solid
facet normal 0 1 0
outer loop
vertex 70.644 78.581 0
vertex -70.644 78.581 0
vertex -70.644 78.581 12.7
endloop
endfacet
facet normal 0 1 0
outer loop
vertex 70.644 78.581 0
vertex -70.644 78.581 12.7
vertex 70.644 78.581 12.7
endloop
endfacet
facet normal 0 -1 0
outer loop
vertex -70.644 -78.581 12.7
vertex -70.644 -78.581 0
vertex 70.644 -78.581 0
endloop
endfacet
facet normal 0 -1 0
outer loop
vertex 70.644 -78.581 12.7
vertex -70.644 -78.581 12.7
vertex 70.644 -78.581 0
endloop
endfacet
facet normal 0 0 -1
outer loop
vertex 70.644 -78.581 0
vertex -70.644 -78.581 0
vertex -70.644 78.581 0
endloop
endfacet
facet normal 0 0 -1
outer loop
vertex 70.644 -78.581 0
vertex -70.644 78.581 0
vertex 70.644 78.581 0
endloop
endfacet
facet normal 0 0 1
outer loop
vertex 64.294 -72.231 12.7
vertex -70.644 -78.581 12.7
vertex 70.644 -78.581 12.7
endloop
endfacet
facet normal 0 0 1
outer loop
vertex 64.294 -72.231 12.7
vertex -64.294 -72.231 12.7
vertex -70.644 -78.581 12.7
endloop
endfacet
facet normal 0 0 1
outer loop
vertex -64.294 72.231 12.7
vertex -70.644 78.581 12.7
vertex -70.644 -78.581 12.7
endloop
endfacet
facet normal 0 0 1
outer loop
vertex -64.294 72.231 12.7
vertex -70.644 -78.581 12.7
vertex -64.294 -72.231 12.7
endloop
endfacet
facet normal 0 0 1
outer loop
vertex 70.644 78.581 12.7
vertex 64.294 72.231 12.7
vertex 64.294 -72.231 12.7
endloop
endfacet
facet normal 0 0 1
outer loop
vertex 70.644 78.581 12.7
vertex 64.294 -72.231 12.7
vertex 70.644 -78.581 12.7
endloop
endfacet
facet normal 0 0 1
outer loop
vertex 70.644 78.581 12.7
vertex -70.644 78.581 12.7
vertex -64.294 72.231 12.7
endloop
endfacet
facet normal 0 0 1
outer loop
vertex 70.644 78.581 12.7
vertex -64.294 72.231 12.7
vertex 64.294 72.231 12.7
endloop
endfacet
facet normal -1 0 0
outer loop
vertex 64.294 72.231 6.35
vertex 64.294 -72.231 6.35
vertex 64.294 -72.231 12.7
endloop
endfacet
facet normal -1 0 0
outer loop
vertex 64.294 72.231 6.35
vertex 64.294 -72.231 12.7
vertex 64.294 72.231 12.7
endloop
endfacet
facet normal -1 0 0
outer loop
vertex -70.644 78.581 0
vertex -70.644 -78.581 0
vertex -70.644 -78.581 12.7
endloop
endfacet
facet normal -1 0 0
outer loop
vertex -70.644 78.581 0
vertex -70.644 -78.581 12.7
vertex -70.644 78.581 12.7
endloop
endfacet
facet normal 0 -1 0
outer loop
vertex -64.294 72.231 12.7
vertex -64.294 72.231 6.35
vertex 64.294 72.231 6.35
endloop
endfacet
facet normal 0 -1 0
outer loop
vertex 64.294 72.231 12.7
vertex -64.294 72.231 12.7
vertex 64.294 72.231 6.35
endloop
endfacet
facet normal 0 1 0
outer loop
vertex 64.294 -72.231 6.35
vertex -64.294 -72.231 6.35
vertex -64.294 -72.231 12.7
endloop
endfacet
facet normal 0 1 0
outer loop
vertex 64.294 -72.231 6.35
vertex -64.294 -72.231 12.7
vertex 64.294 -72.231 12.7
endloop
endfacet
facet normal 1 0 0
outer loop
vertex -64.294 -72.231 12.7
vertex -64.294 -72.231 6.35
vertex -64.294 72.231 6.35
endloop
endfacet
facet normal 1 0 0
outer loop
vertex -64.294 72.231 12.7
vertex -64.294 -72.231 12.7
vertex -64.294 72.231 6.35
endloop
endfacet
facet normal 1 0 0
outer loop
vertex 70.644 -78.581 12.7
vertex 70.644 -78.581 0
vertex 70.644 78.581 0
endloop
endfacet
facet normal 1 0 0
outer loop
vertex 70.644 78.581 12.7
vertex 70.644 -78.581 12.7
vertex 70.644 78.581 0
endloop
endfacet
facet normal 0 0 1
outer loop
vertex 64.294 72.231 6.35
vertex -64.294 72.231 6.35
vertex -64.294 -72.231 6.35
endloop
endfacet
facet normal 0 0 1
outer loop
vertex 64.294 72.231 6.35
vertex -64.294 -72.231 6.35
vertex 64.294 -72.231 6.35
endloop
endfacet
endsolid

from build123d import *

# Parameters (mm, degrees)
SKETCH2_W           = 141.2875
SKETCH2_H           = 157.1625
BOSS_EXTRUDE1_DEPTH = 12.7
SHELL1_T            = -6.35


with BuildPart() as part:
    # Sketch2 → Boss-Extrude1 (new body)
    with BuildSketch(Plane.XY):
        Rectangle(SKETCH2_W, SKETCH2_H)
    extrude(amount=BOSS_EXTRUDE1_DEPTH)

    # Shell1
    shell1_openings = [part.faces().sort_by_distance(p)[0] for p in [
        (0, 0, 12.7),
    ]]
    offset(amount=SHELL1_T, openings=shell1_openings, kind=Kind.INTERSECTION)


solid = part.part
